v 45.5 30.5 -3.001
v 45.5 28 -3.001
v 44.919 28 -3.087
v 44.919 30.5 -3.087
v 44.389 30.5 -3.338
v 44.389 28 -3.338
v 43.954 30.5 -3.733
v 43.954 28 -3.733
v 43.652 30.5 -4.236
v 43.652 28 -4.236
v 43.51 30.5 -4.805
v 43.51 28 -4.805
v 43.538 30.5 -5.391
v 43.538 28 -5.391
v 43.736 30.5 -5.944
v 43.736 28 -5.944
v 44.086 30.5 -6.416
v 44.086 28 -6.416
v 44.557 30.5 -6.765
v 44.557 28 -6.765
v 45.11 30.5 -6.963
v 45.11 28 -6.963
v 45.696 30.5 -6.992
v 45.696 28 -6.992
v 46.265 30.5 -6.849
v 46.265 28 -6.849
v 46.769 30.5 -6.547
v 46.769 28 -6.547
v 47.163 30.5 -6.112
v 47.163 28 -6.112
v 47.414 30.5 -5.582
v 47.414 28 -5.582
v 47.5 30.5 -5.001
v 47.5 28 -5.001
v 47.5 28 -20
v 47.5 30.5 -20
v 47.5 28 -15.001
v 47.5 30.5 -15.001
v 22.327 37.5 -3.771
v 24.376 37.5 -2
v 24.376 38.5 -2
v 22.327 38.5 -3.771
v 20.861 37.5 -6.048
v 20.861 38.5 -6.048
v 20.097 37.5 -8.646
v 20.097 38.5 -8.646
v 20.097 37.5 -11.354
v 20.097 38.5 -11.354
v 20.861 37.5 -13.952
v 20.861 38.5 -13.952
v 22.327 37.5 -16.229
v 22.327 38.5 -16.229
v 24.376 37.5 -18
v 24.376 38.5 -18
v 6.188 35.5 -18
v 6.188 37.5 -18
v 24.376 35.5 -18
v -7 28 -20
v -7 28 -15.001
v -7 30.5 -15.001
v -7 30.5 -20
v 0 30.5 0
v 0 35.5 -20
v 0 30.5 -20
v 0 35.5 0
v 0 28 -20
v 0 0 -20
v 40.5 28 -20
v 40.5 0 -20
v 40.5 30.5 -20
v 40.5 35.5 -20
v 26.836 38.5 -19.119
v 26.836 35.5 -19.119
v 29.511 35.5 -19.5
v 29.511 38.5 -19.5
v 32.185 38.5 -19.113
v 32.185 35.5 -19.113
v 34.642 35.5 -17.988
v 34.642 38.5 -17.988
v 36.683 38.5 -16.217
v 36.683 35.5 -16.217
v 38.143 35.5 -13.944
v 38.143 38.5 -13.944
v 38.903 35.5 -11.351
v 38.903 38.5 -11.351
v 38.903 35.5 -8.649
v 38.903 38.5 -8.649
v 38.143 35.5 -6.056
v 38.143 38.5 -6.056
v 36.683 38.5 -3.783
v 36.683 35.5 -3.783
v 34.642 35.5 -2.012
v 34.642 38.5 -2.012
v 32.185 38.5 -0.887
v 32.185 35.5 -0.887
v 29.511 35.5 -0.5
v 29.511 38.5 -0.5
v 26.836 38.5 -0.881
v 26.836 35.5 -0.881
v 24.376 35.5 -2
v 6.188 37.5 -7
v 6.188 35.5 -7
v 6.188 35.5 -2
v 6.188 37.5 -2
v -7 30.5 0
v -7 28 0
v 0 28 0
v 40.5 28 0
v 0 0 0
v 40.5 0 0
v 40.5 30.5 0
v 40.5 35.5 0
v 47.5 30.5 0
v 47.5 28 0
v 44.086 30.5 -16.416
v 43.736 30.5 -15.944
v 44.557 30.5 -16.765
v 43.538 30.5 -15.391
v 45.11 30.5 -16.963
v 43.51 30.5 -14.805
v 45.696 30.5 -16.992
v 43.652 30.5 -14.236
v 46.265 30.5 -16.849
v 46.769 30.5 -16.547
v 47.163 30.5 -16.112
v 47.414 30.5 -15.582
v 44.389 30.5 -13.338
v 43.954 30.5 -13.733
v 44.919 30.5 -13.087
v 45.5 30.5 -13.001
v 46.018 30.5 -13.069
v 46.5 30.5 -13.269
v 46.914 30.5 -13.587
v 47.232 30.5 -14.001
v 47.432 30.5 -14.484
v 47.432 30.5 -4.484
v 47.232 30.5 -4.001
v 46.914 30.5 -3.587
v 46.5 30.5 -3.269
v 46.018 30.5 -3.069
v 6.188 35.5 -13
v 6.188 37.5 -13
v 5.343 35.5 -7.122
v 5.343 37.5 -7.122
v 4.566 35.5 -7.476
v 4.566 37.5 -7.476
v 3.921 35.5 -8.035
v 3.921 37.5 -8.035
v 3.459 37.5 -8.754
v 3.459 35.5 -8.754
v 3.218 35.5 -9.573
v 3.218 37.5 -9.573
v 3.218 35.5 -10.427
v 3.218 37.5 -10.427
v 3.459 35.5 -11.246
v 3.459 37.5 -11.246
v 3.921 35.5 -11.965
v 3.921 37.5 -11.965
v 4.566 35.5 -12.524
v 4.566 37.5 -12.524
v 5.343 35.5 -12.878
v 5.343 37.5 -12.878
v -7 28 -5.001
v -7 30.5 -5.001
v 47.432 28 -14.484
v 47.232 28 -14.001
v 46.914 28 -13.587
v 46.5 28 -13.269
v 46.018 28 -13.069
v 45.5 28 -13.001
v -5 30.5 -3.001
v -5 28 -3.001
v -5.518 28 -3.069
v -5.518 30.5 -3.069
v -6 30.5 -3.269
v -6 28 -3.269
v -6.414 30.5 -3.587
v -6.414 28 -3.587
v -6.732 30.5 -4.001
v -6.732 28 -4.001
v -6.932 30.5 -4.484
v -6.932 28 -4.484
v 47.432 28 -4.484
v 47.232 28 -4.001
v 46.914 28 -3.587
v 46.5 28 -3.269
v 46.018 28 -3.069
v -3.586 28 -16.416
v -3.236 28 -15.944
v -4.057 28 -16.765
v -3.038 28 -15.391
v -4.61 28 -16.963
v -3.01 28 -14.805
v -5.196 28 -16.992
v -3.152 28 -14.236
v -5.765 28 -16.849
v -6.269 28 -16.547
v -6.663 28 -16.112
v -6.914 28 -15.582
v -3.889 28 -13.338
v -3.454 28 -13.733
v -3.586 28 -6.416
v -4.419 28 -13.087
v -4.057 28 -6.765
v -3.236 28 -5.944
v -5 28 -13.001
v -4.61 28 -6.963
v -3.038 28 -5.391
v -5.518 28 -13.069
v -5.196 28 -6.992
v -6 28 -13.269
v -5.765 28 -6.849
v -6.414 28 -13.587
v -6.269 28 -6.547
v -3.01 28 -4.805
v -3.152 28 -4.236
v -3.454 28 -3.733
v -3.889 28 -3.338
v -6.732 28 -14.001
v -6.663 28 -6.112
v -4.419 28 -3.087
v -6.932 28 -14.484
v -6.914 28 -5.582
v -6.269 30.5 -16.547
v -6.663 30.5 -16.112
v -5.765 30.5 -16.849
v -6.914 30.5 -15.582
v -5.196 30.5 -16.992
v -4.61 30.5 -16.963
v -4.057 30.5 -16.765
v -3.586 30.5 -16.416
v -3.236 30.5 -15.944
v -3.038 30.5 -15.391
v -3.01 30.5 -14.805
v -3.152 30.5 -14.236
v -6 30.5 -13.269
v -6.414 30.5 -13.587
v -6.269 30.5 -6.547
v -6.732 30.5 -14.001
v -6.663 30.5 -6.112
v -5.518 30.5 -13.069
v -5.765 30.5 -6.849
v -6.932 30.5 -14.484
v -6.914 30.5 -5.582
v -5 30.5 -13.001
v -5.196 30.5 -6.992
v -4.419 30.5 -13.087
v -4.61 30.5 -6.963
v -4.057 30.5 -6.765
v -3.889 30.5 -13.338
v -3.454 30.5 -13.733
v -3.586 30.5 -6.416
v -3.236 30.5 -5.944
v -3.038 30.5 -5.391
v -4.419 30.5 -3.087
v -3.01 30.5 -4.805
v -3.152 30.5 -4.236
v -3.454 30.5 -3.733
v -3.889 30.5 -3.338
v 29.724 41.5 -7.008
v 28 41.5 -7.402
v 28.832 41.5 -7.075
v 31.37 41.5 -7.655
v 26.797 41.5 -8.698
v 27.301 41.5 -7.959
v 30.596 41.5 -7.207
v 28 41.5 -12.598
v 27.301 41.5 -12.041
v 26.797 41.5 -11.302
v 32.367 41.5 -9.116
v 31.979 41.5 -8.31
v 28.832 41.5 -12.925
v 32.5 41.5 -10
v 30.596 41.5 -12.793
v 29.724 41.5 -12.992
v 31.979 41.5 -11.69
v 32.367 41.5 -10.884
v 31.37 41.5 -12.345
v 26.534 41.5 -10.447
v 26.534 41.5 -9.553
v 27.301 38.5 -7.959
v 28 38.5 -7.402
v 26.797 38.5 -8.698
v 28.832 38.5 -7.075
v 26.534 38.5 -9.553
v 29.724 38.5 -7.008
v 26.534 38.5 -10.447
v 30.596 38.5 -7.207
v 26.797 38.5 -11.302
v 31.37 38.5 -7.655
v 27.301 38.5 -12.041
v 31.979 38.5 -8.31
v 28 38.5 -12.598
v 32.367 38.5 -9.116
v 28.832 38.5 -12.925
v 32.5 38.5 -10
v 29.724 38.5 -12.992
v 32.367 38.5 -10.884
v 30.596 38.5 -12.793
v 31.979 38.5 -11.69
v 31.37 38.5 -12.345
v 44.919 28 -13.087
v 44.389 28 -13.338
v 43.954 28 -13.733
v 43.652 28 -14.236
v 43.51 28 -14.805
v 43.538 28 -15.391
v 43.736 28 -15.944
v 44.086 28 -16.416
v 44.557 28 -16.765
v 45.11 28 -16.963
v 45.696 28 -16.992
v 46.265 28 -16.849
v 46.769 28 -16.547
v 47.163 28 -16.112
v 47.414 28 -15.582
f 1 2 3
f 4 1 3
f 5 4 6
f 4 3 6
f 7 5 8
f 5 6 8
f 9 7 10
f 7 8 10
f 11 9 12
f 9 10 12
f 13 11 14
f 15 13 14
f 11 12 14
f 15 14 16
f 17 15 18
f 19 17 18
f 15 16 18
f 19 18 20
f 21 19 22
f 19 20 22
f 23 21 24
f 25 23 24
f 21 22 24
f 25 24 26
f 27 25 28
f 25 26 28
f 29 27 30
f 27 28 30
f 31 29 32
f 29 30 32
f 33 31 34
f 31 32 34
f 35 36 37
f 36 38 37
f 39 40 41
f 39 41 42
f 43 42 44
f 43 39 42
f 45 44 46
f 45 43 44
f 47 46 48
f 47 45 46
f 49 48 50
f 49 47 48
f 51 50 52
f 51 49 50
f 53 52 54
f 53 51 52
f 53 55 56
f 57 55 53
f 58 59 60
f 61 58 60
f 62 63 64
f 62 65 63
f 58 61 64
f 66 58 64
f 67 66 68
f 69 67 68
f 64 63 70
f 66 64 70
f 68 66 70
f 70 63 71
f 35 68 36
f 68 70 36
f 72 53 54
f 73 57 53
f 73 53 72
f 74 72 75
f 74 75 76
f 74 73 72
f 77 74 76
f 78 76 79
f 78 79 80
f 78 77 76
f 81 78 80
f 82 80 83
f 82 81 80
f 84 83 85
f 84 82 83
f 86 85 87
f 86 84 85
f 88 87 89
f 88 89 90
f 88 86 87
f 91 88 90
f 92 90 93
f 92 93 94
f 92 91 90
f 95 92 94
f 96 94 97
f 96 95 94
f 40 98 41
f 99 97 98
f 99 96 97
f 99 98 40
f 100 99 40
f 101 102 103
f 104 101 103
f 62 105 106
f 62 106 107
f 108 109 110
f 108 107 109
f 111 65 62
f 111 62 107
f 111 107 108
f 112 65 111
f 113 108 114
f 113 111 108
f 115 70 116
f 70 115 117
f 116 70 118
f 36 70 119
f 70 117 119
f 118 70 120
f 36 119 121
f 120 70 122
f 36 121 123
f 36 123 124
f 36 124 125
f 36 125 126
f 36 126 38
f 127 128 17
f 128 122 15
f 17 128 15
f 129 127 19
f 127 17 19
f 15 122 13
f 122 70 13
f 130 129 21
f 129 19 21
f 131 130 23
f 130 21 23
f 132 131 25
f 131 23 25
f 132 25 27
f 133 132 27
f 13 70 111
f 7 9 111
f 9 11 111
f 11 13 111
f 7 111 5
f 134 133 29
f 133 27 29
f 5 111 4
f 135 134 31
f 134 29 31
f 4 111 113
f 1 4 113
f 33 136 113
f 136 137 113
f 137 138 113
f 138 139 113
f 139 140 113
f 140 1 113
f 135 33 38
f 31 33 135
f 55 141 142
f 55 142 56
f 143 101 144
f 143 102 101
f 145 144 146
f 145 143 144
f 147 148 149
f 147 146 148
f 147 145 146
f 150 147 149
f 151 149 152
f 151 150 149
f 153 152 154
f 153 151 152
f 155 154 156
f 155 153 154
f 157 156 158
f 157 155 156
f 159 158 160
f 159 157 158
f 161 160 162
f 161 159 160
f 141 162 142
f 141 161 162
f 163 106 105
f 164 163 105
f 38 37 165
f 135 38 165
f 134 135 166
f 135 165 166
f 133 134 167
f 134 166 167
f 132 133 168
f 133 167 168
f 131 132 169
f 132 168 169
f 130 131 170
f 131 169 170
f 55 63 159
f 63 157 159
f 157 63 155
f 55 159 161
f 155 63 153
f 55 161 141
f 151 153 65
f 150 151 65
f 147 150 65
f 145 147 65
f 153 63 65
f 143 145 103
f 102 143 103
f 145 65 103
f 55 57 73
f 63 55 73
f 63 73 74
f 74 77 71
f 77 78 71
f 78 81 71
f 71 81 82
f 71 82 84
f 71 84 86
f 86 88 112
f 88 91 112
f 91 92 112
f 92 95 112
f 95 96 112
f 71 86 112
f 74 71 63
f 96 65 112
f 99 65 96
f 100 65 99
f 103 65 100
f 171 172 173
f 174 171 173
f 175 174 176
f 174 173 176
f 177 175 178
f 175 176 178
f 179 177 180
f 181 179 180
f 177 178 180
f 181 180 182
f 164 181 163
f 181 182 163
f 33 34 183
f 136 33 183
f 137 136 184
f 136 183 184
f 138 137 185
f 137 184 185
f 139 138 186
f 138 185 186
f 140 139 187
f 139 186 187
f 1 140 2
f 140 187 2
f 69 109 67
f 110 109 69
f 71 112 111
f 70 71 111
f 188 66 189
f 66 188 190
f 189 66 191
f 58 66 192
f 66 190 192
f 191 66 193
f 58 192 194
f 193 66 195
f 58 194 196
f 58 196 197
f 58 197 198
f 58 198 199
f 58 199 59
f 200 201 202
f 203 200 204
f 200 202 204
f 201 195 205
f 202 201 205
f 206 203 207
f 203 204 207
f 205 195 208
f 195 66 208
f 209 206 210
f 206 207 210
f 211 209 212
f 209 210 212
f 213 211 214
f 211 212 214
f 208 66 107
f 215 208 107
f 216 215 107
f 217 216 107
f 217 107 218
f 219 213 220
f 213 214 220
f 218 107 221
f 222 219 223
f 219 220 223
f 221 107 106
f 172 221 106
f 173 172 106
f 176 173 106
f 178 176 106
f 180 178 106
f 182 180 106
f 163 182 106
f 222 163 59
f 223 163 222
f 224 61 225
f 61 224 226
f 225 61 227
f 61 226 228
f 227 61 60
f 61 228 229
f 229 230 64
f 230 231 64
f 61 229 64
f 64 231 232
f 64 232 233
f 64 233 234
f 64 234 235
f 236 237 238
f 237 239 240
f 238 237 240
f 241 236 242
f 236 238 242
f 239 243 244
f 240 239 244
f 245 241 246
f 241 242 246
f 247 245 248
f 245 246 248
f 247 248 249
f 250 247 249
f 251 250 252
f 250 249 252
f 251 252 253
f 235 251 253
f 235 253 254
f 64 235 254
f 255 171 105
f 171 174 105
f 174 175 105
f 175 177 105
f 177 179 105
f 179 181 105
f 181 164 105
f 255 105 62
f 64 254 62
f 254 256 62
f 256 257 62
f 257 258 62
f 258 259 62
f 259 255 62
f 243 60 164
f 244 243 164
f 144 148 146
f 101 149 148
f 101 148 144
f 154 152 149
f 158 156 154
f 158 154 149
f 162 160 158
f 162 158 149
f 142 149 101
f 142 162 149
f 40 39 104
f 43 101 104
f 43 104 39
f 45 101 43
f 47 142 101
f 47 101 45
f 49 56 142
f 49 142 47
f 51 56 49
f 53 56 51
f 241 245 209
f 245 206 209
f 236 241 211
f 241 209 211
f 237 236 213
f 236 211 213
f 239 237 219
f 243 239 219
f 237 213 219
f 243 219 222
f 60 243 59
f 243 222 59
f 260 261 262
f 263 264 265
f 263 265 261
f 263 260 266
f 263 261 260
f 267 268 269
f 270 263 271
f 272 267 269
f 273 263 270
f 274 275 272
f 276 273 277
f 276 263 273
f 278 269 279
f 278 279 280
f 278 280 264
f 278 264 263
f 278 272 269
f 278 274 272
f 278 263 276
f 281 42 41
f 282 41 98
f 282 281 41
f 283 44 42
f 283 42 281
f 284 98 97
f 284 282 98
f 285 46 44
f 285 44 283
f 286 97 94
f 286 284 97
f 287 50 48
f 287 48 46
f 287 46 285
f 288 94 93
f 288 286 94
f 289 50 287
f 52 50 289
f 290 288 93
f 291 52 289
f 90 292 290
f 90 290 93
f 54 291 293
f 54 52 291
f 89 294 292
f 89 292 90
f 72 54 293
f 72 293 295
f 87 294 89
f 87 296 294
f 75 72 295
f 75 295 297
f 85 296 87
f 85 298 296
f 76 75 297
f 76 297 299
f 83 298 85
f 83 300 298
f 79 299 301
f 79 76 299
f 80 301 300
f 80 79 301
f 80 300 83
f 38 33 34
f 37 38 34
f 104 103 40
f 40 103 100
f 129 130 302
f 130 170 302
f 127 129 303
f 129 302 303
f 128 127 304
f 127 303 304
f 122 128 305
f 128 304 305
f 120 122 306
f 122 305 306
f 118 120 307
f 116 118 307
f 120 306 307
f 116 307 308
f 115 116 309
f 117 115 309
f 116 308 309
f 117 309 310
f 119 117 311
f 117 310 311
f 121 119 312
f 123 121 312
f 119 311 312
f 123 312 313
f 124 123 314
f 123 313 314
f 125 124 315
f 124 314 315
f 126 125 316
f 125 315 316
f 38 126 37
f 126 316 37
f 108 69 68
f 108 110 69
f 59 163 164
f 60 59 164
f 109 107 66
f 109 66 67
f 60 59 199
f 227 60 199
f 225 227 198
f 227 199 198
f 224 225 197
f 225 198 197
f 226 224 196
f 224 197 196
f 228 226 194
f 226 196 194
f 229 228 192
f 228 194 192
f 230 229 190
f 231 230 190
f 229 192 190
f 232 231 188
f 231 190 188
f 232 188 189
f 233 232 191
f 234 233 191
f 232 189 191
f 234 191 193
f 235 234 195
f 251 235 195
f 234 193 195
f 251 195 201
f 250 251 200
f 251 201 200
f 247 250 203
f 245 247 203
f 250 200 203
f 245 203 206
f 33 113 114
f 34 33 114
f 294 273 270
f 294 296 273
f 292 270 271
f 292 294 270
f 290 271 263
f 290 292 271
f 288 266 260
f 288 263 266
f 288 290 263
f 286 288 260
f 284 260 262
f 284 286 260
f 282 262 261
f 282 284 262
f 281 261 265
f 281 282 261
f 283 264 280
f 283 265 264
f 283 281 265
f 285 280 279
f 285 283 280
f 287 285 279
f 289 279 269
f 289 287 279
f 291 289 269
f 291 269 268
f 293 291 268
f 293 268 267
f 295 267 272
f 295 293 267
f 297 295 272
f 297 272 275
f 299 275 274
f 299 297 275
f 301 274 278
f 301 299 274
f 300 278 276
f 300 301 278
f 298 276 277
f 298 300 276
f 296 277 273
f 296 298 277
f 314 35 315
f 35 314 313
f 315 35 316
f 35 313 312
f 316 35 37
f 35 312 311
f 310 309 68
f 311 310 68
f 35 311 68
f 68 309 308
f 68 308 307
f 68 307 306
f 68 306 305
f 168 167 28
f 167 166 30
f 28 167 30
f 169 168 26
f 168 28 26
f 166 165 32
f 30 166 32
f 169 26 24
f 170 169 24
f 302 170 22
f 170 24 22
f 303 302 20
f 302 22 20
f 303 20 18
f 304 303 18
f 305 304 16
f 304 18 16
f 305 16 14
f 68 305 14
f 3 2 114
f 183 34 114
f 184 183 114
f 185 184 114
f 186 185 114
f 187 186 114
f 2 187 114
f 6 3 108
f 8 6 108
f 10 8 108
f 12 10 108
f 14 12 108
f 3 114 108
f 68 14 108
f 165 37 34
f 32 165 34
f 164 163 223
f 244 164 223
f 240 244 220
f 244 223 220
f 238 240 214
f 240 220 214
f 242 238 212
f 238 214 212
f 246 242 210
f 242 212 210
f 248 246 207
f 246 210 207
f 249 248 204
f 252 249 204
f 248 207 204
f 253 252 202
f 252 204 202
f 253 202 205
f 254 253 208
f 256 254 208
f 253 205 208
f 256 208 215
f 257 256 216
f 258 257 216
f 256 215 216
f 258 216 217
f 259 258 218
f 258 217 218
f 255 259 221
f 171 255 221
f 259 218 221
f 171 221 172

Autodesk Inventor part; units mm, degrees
ref_plane "YZ Plane" through (0, 0, 0) normal (1, 0, 0) x (0, 1, 0)
ref_plane "XZ Plane" through (0, 0, 0) normal (0, 1, 0) x (-1, 0, 0)
ref_plane "XY Plane" through (0, 0, 0) normal (0, 0, 1) x (1, 0, 0)
sketch "Boceto1" plane through (0, 0, 0) normal (0, 0, 1) x (1, 0, 0)
  line L0 (0, 0) -> (40.5, 0)
  line L1 (40.5, 0) -> (40.5, 28)
  line L2 (40.5, 28) -> (0, 28)
  line L3 (0, 28) -> (0, 0)
extrude "Extrusión1" add sketch "Boceto1" against normal blind 20
sketch "Boceto2" plane through (0, 0, 0) normal (0, 0, 1) x (1, 0, 0)
  line L0 (0, 0) -> (0, 28) projected
  line L1 (0, 28) -> (-7, 28)
  line L2 (-7, 28) -> (-7, 30.5)
  line L3 (-7, 30.5) -> (47.5, 30.5)
  line L4 (47.5, 30.5) -> (47.5, 28)
  line L5 (40.5, 28) -> (40.5, 0) projected
  line L6 (47.5, 28) -> (40.5, 28)
  line L7 (40.5, 28) -> (0, 28)
extrude "Extrusión2" add sketch "Boceto2" against normal blind 20
sketch "Boceto3" plane through (0, 0, 0) normal (0, 0, 1) x (1, 0, 0)
  line L0 (0, 35.5) -> (0, 30.5)
  line L1 (47.5, 30.5) -> (-7, 30.5) projected
  line L2 (0, 30.5) -> (40.5, 30.5)
  line L3 (0, 35.5) -> (40.5, 35.5)
  line L4 (40.5, 35.5) -> (40.5, 30.5)
  point P0 (0, 0)
extrude "Extrusión3" add sketch "Boceto3" against normal blind 20
sketch "Boceto4" plane through (0, 35.5, 0) normal (0, 1, 0) x (1, 0, 0)
  circle A0 centre (45.5, 5.0013) radius 2
  circle A1 centre (45.5, 15.0013) radius 2
  line L0 (-7, 0) -> (-7, 20) projected
  circle A2 centre (-5, 15.0013) radius 2
  circle A3 centre (-5, 5.0013) radius 2
  point P0 (0, 0)
hole "Agujero1" at (-5, 35.5, -15.0013) at (-5, 35.5, -5.0013) at (45.5, 35.5, -5.0013) at (45.5, 35.5, -15.0013) direction (0, -1, 0) diameter 4 end through all
sketch "Boceto5" plane through (0, 35.5, 0) normal (0, 1, 0) x (1, 0, 0)
  arc A0 (24.3765, 2) -> (24.3765, 18) centre (29.5, 10) ccw
  arc A1 (6.1878, 13) -> (6.1878, 7) centre (6.1878, 10) ccw
  line L0 (6.1878, 13) -> (6.1878, 15)
  line L1 (6.1878, 7) -> (6.1878, 5)
  line L2 (0, 20) -> (40.5, 20) projected
  line L3 (6.1878, 15) -> (6.1878, 18)
  line L4 (6.1878, 5) -> (6.1878, 2)
  line L5 (6.1878, 2) -> (24.3765, 2)
  line L6 (6.1878, 18) -> (24.3765, 18)
  circle A2 centre (29.5, 10) radius 9.5
  point P0 (24.3765, 18)
  point P1 (24.3765, 2)
  point P2 (24.3765, 2)
  point P3 (24.3765, 18)
extrude "Extrusión4" add sketch "Boceto5" along normal blind 3 contours A2 A0
extrude "Extrusión5" add sketch "Boceto5" along normal blind 2 contours L5 L4 L1 A1 L0 L3 L6 A2
sketch "Boceto6" plane through (29.5, 38.5, -10) normal (0, 1, 0) x (1, 0, 0)
  circle A0 centre (0, 0) radius 3
  point P0 (-29.5, -10)
extrude "Extrusión6" add sketch "Boceto6" along normal blind 3
thread "Rosca1" size "M6x1" class "6g" standard "ANSI Metric M Profile" length 2
sketch "Boceto7" plane through (29.5, 41.5, -10) normal (0, 1, 0) x (1, 0, 0)
  point P0 (-29.5, -10)
properties part number "Servo" material "Oro"
